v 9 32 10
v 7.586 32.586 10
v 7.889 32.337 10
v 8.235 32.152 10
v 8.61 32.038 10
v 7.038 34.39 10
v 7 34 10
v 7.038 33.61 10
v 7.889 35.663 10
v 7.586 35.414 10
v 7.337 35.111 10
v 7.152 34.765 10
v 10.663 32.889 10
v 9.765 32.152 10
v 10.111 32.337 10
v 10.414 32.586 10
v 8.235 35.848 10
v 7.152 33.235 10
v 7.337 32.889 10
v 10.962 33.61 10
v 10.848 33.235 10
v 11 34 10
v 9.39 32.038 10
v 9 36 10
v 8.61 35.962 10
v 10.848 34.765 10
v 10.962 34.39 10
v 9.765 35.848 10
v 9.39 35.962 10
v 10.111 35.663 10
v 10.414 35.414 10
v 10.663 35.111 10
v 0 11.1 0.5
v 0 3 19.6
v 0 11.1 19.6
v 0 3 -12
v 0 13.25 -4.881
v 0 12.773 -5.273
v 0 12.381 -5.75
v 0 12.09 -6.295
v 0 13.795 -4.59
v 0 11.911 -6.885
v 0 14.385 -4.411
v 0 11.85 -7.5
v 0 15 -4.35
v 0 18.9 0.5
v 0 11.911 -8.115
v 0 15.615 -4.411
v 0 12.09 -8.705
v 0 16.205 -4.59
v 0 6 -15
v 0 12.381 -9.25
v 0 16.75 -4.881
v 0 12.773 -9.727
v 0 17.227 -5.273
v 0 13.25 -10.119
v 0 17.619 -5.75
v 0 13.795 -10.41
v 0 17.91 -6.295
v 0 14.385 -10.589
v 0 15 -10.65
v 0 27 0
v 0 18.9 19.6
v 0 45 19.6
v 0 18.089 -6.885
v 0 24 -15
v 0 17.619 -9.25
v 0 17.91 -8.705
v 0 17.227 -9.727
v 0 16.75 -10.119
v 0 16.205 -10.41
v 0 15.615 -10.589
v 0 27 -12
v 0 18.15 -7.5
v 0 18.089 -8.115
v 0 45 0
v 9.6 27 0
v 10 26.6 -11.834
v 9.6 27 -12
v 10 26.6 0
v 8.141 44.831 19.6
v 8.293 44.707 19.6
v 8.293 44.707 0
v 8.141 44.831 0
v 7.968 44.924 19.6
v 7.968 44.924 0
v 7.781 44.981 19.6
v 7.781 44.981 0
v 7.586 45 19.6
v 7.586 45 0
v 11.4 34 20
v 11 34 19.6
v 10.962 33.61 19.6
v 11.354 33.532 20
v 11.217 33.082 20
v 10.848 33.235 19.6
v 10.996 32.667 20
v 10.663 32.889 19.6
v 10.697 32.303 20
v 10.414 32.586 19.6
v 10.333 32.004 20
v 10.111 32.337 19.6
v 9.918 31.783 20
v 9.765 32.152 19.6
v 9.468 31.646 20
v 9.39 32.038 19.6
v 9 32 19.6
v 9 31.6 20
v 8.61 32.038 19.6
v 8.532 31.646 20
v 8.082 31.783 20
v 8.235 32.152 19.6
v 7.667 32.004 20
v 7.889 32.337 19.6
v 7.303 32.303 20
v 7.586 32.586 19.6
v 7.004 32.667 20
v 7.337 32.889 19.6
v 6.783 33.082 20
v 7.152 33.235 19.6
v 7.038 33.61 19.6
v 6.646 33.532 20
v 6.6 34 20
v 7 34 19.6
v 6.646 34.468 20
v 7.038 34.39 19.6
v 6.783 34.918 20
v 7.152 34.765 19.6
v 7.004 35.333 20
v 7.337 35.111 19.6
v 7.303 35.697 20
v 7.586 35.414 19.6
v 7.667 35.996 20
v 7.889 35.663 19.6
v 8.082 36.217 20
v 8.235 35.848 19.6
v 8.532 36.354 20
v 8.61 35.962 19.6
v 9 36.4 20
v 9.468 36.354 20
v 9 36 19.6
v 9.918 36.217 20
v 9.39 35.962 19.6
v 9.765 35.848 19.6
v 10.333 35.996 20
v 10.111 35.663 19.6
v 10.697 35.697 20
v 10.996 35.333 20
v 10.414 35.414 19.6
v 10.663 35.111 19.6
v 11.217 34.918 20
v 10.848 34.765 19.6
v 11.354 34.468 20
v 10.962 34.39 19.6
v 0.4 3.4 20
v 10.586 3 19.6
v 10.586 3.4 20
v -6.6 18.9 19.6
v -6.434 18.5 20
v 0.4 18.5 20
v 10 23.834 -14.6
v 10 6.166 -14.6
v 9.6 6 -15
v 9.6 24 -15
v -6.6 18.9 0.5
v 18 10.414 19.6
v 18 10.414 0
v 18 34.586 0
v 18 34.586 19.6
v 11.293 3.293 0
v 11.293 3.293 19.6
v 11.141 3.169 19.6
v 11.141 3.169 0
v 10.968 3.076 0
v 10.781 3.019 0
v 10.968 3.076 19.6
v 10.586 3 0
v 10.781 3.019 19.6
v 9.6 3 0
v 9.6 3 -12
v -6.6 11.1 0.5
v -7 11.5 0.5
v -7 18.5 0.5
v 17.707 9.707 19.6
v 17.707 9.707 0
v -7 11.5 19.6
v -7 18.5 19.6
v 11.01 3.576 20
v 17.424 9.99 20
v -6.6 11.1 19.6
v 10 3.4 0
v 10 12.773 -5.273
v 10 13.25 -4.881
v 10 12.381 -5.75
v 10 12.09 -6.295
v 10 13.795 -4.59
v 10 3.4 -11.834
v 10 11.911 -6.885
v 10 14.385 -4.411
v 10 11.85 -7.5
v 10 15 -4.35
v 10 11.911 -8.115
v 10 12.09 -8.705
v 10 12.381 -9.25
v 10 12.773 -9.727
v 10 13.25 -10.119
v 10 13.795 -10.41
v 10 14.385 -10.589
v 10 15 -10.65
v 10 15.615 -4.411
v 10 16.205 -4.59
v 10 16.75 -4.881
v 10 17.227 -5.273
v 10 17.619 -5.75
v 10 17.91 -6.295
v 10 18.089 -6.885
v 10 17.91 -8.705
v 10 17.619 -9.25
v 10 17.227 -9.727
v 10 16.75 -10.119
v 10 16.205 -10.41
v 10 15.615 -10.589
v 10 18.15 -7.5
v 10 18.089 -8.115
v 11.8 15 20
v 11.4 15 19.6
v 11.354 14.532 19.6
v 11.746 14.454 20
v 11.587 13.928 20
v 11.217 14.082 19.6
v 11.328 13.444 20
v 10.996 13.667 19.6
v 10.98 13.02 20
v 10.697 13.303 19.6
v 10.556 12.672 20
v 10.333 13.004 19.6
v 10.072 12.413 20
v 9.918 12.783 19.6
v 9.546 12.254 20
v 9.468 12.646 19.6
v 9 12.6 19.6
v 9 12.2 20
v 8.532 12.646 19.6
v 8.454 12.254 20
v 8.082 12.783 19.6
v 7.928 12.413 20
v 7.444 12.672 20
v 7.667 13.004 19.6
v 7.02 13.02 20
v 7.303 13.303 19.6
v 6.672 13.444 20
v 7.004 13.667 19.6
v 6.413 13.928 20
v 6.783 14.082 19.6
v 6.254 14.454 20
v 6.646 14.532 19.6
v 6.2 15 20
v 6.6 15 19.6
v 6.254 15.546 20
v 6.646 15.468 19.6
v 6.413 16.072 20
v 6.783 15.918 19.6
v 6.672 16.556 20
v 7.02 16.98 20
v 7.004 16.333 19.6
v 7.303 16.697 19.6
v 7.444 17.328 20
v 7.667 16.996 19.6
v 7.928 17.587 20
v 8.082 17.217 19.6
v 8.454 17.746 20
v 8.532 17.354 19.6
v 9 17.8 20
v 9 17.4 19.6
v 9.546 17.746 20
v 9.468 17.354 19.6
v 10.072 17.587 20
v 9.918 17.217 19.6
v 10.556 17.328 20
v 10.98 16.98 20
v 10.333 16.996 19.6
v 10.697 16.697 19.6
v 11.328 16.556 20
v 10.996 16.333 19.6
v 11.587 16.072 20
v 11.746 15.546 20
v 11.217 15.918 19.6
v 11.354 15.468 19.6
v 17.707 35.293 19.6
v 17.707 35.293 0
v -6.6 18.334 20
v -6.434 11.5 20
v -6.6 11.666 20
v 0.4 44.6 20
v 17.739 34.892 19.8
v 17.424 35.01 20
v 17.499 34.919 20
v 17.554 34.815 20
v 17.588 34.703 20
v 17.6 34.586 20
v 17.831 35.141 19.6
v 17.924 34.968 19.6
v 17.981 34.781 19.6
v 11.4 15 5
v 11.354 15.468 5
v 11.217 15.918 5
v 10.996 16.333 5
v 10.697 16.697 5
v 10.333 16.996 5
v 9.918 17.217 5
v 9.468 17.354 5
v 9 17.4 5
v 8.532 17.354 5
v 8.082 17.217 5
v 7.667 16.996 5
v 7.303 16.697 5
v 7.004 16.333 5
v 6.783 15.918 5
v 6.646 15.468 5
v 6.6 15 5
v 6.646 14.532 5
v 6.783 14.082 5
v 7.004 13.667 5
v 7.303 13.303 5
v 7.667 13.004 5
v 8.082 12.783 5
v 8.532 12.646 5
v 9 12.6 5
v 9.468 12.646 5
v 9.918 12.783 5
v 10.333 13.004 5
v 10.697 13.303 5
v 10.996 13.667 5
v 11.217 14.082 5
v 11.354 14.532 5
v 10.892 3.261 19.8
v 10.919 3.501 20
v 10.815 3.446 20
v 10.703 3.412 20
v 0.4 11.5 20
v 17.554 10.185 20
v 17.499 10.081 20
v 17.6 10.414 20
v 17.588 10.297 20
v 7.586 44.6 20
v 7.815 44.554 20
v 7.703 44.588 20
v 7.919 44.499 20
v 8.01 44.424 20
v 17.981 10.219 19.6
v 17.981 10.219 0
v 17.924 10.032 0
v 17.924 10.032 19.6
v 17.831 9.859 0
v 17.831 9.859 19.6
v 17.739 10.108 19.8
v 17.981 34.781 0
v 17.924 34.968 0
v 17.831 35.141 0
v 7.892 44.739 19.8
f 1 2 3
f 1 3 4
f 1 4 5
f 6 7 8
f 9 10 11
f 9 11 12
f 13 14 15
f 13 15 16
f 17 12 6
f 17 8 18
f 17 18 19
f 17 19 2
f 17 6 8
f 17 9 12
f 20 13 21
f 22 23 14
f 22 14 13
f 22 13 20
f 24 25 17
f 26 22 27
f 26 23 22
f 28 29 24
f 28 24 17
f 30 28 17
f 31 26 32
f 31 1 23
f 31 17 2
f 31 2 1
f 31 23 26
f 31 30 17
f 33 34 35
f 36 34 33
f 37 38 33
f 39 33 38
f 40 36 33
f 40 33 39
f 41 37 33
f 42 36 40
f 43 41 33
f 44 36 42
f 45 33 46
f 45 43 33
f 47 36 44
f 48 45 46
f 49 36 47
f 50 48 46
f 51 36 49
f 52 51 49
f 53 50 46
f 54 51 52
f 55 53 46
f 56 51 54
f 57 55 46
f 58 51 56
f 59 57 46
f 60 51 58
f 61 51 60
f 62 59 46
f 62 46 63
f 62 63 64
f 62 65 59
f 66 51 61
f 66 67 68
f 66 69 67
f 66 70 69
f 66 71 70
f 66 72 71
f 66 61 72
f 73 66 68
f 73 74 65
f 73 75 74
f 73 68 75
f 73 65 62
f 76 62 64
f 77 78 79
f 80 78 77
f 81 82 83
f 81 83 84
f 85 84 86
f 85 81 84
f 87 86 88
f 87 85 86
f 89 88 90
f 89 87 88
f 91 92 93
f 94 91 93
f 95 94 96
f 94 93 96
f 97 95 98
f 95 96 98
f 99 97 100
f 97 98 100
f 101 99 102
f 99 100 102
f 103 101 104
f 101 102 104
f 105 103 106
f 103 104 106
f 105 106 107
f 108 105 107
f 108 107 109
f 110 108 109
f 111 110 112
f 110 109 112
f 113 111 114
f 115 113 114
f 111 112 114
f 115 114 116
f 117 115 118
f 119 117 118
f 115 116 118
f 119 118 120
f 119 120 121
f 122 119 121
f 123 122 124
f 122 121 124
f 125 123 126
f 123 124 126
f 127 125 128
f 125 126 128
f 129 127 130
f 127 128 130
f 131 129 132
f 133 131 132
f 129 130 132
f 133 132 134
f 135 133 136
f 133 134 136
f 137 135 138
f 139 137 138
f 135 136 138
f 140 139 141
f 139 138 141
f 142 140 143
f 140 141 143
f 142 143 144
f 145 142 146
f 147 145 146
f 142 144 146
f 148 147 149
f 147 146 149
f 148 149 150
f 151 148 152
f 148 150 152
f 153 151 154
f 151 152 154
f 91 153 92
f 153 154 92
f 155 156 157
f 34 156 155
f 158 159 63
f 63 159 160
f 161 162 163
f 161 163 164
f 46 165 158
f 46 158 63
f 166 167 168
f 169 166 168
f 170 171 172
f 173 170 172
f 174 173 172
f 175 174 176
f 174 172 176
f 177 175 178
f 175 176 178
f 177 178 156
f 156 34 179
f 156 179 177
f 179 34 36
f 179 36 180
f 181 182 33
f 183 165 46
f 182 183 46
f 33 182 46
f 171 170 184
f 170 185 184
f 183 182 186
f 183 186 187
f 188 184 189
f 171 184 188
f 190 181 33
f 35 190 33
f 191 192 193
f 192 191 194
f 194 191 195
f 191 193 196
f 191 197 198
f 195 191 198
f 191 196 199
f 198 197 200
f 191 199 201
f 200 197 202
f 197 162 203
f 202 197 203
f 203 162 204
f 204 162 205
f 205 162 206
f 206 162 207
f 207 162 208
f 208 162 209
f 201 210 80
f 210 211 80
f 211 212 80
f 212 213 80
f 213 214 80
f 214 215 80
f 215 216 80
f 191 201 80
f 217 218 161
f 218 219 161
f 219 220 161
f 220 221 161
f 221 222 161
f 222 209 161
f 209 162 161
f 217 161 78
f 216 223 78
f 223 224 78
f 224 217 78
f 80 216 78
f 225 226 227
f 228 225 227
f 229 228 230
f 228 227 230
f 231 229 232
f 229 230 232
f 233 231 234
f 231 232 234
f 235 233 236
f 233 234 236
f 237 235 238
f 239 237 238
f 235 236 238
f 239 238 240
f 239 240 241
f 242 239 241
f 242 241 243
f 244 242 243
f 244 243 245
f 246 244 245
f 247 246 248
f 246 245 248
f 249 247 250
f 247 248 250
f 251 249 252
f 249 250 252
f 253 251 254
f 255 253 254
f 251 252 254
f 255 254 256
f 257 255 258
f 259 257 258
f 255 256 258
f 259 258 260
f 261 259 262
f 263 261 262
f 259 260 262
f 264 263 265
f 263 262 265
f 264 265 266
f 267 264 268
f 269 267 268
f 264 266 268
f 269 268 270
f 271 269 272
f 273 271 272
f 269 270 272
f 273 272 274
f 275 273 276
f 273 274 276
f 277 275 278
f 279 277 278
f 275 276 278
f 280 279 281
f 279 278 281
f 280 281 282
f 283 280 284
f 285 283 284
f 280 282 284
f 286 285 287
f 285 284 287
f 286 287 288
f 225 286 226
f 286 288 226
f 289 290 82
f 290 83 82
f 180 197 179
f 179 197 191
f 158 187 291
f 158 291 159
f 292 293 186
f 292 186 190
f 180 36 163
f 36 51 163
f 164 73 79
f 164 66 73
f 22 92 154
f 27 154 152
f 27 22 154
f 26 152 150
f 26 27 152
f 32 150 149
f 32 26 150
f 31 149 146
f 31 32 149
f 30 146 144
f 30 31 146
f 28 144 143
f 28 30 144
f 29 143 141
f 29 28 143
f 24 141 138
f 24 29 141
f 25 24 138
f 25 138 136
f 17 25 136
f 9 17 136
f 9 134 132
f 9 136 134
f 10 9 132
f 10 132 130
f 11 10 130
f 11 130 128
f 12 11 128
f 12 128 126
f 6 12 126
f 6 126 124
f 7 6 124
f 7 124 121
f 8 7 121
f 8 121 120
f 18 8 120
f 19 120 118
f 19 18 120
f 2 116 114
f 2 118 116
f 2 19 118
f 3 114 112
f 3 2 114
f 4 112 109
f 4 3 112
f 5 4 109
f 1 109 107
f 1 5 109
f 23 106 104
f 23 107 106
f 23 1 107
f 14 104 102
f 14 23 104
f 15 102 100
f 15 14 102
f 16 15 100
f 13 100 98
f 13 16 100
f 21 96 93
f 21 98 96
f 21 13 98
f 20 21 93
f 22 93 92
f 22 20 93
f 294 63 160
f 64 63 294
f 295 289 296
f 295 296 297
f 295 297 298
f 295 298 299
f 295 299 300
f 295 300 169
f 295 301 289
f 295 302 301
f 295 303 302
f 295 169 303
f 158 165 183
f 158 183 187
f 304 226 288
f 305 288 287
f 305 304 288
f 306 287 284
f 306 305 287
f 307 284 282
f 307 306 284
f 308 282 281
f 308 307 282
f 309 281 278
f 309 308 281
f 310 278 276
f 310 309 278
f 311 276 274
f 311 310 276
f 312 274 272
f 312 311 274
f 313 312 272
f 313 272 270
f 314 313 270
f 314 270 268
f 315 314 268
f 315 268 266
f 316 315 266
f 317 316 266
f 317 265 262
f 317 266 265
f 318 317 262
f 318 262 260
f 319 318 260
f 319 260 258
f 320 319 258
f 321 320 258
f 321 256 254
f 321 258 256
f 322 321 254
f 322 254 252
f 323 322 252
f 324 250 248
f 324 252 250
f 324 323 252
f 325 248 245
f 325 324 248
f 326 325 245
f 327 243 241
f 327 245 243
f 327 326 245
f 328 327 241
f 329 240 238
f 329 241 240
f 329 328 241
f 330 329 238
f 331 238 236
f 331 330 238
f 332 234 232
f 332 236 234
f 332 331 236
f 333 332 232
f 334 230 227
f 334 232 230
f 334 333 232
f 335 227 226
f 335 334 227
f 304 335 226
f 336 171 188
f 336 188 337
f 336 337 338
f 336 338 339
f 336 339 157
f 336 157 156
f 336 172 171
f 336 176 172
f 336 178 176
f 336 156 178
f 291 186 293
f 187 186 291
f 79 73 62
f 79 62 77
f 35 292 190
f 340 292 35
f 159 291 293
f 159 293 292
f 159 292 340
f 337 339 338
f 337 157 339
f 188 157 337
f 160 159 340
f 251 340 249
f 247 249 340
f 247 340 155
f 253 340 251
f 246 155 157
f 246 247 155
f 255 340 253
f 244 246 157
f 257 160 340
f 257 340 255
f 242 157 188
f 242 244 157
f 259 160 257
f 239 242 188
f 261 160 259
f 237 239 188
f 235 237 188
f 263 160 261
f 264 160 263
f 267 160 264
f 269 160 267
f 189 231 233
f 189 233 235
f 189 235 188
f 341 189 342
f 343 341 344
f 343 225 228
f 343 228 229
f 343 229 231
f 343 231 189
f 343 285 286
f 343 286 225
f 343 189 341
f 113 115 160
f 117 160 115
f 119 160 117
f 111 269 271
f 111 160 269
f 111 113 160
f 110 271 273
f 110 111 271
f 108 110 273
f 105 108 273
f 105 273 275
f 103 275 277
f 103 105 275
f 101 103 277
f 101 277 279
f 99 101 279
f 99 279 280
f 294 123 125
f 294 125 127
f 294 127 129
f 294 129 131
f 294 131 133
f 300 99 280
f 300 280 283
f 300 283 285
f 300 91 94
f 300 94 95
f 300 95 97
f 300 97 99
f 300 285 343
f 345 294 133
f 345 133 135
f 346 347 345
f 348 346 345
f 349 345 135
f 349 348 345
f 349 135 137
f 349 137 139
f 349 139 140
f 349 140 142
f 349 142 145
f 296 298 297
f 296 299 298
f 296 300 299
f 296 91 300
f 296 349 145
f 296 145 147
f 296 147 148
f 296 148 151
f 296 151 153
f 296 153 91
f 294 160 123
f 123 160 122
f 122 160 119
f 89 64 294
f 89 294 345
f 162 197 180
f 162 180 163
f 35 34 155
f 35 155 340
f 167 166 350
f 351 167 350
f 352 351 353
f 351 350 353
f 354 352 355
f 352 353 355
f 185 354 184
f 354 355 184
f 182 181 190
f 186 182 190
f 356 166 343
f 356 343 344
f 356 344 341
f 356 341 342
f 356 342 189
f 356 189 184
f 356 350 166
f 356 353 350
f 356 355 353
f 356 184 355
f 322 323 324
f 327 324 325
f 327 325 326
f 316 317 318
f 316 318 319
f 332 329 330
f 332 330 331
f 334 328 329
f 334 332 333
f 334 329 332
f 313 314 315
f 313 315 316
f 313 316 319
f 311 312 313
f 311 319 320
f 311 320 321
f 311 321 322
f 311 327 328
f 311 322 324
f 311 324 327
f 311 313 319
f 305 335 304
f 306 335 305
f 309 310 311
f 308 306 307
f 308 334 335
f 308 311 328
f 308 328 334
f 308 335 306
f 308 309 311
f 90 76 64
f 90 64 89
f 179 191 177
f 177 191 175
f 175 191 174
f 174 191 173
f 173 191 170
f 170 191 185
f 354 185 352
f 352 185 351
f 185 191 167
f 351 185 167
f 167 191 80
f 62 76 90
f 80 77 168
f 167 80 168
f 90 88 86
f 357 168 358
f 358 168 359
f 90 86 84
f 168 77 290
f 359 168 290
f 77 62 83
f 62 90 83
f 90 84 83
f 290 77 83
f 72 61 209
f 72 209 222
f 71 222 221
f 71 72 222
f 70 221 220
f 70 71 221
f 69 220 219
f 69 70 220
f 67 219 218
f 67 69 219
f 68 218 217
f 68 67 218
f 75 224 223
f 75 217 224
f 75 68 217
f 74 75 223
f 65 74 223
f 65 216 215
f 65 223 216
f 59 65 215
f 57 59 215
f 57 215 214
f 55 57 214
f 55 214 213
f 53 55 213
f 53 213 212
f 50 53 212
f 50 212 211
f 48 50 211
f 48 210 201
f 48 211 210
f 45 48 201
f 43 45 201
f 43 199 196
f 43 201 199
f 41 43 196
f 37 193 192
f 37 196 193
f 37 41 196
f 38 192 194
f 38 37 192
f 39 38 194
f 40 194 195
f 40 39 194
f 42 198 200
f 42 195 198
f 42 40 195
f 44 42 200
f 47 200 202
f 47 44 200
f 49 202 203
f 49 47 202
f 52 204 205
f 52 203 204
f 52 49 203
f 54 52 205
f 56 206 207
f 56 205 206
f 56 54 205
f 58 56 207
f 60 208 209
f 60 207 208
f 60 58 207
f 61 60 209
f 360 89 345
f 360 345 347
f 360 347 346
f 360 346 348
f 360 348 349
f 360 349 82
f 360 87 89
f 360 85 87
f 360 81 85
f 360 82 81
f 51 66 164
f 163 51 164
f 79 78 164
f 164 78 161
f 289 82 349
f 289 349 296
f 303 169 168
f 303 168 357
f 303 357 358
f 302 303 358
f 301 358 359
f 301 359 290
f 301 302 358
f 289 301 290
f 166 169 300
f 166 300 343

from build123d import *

# Parameters (mm, degrees)
BOX016_W          = 10
BOX016_H          = 10
BOX016_DEPTH      = 17
CYLINDER004_R     = 2.4
CYLINDER004_DEPTH = 35
CYLINDER003_R     = 2
CYLINDER003_DEPTH = 30
CYLINDER008_R     = 3.15
CYLINDER008_DEPTH = 14
BOX007_W          = 7
BOX007_H          = 7.8
BOX007_DEPTH      = 20
CHAMFER005_SIZE   = 0.4
BOX006_W          = 10
BOX006_H          = 24
BOX006_DEPTH      = 15
CHAMFER004_SIZE   = 3
CHAMFER011_SIZE   = 0.4
BOX_W             = 1
BOX_H             = 7.8
BOX_DEPTH         = 15
BOX008_W          = 18
BOX008_H          = 42
BOX008_DEPTH      = 20
CHAMFER_SIZE      = 7
CHAMFER010_SIZE   = 10
FILLET002_R       = 1
CHAMFER013_SIZE   = 0.4


with BuildPart() as cube016:
    # Box016 → Box016 (new body)
    with BuildSketch(Plane(origin=(-10, 10, -16.5), x_dir=(1, 0, 0), z_dir=(0, 0, 1))):
        with Locations((5, 5)):
            Rectangle(BOX016_W, BOX016_H)
    extrude(amount=BOX016_DEPTH)


with BuildPart() as cylinder004:
    # Cylinder004 → Cylinder004 (new body)
    with BuildSketch(Plane(origin=(9, 15, 5), x_dir=(1, 0, 0), z_dir=(0, 0, 1))):
        Circle(CYLINDER004_R)
    extrude(amount=CYLINDER004_DEPTH)


with BuildPart() as cylinder003:
    # Cylinder003 → Cylinder003 (new body)
    with BuildSketch(Plane(origin=(9, 34, 10), x_dir=(1, 0, 0), z_dir=(0, 0, 1))):
        Circle(CYLINDER003_R)
    extrude(amount=CYLINDER003_DEPTH)


with BuildPart() as cylinder008:
    # Cylinder008 → Cylinder008 (new body)
    with BuildSketch(Plane(origin=(-2, 15, -7.5), x_dir=(0, 0, -1), z_dir=(1, 0, 0))):
        Circle(CYLINDER008_R)
    extrude(amount=CYLINDER008_DEPTH)


with BuildPart() as chamfer005:
    # Box007 → Box007 (new body)
    with BuildSketch(Plane(origin=(-7, 11.1, 0), x_dir=(1, 0, 0), z_dir=(0, 0, 1))):
        with Locations((3.5, 3.9)):
            Rectangle(BOX007_W, BOX007_H)
    extrude(amount=BOX007_DEPTH)

    # Chamfer005
    chamfer005_edges = [chamfer005.edges().sort_by_distance(p)[0] for p in [
        (-7, 11.1, 10),
        (-7, 18.9, 10),
    ]]
    chamfer(chamfer005_edges, length=CHAMFER005_SIZE)


with BuildPart() as chamfer011:
    # Box006 → Box006 (new body)
    with BuildSketch(Plane(origin=(0, 3, -15), x_dir=(1, 0, 0), z_dir=(0, 0, 1))):
        with Locations((5, 12)):
            Rectangle(BOX006_W, BOX006_H)
    extrude(amount=BOX006_DEPTH)

    # Chamfer004
    chamfer004_edges = [chamfer011.edges().sort_by_distance(p)[0] for p in [
        (5, 3, -15),
        (5, 27, -15),
    ]]
    chamfer(chamfer004_edges, length=CHAMFER004_SIZE)

    # Chamfer011
    chamfer011_edges = [chamfer011.edges().sort_by_distance(p)[0] for p in [
        (10, 3, -6),
        (10, 4.5, -13.5),
        (10, 15, -15),
        (10, 27, -6),
        (10, 25.5, -13.5),
    ]]
    chamfer(chamfer011_edges, length=CHAMFER011_SIZE)


with BuildPart() as cube:
    # Box → Box (new body)
    with BuildSketch(Plane(origin=(-1, 11.1, -15), x_dir=(1, 0, 0), z_dir=(0, 0, 1))):
        with Locations((0.5, 3.9)):
            Rectangle(BOX_W, BOX_H)
    extrude(amount=BOX_DEPTH)


with BuildPart() as cut002002002007004004001005:
    # Box008 → Box008 (new body)
    with BuildSketch(Plane(origin=(0, 3, 0), x_dir=(1, 0, 0), z_dir=(0, 0, 1))):
        with Locations((9, 21)):
            Rectangle(BOX008_W, BOX008_H)
    extrude(amount=BOX008_DEPTH)

    # Chamfer
    chamfer_edges = [cut002002002007004004001005.edges().sort_by_distance(p)[0] for p in [
        (18, 3, 10),
    ]]
    chamfer(chamfer_edges, length=CHAMFER_SIZE)

    # Chamfer010
    chamfer010_edges = [cut002002002007004004001005.edges().sort_by_distance(p)[0] for p in [
        (18, 45, 10),
    ]]
    chamfer(chamfer010_edges, length=CHAMFER010_SIZE)

    # Fillet002
    fillet002_edges = [cut002002002007004004001005.edges().sort_by_distance(p)[0] for p in [
        (18, 35, 10),
        (18, 10, 10),
        (8, 45, 10),
        (11, 3, 10),
    ]]
    fillet(fillet002_edges, radius=FILLET002_R)

    # Fusion: union Chamfer005, Chamfer011, Cube
    add(chamfer005.part)
    add(chamfer011.part)
    add(cube.part)

    # Cut: cut Cylinder008
    add(cylinder008.part, mode=Mode.SUBTRACT)

    # Cut002002002008: cut Cylinder003
    add(cylinder003.part, mode=Mode.SUBTRACT)

    # Cut002002002009: cut Cylinder004
    add(cylinder004.part, mode=Mode.SUBTRACT)

    # Chamfer013
    chamfer013_edges = [cut002002002007004004001005.edges().sort_by_distance(p)[0] for p in [
        (-7, 15, 20),
        (-6.8, 18.7, 20),
        (-6.8, 11.3, 20),
        (3.792893, 45, 20),
        (17.92388, 10.03153, 20),
        (14.5, 6.5, 20),
        (10.96847, 3.07612, 20),
        (7.96847, 44.92388, 20),
        (13, 40, 20),
        (17.92388, 34.96847, 20),
        (18, 22.5, 20),
        (-3.3, 11.1, 20),
        (-3.3, 18.9, 20),
        (0, 7.05, 20),
        (0, 31.95, 20),
        (5.292893, 3, 20),
        (6.6, 15, 20),
        (7, 34, 20),
    ]]
    chamfer(chamfer013_edges, length=CHAMFER013_SIZE)

    # Cut002002002007004004001005: cut Cube016
    add(cube016.part, mode=Mode.SUBTRACT)


solid = cut002002002007004004001005.part
